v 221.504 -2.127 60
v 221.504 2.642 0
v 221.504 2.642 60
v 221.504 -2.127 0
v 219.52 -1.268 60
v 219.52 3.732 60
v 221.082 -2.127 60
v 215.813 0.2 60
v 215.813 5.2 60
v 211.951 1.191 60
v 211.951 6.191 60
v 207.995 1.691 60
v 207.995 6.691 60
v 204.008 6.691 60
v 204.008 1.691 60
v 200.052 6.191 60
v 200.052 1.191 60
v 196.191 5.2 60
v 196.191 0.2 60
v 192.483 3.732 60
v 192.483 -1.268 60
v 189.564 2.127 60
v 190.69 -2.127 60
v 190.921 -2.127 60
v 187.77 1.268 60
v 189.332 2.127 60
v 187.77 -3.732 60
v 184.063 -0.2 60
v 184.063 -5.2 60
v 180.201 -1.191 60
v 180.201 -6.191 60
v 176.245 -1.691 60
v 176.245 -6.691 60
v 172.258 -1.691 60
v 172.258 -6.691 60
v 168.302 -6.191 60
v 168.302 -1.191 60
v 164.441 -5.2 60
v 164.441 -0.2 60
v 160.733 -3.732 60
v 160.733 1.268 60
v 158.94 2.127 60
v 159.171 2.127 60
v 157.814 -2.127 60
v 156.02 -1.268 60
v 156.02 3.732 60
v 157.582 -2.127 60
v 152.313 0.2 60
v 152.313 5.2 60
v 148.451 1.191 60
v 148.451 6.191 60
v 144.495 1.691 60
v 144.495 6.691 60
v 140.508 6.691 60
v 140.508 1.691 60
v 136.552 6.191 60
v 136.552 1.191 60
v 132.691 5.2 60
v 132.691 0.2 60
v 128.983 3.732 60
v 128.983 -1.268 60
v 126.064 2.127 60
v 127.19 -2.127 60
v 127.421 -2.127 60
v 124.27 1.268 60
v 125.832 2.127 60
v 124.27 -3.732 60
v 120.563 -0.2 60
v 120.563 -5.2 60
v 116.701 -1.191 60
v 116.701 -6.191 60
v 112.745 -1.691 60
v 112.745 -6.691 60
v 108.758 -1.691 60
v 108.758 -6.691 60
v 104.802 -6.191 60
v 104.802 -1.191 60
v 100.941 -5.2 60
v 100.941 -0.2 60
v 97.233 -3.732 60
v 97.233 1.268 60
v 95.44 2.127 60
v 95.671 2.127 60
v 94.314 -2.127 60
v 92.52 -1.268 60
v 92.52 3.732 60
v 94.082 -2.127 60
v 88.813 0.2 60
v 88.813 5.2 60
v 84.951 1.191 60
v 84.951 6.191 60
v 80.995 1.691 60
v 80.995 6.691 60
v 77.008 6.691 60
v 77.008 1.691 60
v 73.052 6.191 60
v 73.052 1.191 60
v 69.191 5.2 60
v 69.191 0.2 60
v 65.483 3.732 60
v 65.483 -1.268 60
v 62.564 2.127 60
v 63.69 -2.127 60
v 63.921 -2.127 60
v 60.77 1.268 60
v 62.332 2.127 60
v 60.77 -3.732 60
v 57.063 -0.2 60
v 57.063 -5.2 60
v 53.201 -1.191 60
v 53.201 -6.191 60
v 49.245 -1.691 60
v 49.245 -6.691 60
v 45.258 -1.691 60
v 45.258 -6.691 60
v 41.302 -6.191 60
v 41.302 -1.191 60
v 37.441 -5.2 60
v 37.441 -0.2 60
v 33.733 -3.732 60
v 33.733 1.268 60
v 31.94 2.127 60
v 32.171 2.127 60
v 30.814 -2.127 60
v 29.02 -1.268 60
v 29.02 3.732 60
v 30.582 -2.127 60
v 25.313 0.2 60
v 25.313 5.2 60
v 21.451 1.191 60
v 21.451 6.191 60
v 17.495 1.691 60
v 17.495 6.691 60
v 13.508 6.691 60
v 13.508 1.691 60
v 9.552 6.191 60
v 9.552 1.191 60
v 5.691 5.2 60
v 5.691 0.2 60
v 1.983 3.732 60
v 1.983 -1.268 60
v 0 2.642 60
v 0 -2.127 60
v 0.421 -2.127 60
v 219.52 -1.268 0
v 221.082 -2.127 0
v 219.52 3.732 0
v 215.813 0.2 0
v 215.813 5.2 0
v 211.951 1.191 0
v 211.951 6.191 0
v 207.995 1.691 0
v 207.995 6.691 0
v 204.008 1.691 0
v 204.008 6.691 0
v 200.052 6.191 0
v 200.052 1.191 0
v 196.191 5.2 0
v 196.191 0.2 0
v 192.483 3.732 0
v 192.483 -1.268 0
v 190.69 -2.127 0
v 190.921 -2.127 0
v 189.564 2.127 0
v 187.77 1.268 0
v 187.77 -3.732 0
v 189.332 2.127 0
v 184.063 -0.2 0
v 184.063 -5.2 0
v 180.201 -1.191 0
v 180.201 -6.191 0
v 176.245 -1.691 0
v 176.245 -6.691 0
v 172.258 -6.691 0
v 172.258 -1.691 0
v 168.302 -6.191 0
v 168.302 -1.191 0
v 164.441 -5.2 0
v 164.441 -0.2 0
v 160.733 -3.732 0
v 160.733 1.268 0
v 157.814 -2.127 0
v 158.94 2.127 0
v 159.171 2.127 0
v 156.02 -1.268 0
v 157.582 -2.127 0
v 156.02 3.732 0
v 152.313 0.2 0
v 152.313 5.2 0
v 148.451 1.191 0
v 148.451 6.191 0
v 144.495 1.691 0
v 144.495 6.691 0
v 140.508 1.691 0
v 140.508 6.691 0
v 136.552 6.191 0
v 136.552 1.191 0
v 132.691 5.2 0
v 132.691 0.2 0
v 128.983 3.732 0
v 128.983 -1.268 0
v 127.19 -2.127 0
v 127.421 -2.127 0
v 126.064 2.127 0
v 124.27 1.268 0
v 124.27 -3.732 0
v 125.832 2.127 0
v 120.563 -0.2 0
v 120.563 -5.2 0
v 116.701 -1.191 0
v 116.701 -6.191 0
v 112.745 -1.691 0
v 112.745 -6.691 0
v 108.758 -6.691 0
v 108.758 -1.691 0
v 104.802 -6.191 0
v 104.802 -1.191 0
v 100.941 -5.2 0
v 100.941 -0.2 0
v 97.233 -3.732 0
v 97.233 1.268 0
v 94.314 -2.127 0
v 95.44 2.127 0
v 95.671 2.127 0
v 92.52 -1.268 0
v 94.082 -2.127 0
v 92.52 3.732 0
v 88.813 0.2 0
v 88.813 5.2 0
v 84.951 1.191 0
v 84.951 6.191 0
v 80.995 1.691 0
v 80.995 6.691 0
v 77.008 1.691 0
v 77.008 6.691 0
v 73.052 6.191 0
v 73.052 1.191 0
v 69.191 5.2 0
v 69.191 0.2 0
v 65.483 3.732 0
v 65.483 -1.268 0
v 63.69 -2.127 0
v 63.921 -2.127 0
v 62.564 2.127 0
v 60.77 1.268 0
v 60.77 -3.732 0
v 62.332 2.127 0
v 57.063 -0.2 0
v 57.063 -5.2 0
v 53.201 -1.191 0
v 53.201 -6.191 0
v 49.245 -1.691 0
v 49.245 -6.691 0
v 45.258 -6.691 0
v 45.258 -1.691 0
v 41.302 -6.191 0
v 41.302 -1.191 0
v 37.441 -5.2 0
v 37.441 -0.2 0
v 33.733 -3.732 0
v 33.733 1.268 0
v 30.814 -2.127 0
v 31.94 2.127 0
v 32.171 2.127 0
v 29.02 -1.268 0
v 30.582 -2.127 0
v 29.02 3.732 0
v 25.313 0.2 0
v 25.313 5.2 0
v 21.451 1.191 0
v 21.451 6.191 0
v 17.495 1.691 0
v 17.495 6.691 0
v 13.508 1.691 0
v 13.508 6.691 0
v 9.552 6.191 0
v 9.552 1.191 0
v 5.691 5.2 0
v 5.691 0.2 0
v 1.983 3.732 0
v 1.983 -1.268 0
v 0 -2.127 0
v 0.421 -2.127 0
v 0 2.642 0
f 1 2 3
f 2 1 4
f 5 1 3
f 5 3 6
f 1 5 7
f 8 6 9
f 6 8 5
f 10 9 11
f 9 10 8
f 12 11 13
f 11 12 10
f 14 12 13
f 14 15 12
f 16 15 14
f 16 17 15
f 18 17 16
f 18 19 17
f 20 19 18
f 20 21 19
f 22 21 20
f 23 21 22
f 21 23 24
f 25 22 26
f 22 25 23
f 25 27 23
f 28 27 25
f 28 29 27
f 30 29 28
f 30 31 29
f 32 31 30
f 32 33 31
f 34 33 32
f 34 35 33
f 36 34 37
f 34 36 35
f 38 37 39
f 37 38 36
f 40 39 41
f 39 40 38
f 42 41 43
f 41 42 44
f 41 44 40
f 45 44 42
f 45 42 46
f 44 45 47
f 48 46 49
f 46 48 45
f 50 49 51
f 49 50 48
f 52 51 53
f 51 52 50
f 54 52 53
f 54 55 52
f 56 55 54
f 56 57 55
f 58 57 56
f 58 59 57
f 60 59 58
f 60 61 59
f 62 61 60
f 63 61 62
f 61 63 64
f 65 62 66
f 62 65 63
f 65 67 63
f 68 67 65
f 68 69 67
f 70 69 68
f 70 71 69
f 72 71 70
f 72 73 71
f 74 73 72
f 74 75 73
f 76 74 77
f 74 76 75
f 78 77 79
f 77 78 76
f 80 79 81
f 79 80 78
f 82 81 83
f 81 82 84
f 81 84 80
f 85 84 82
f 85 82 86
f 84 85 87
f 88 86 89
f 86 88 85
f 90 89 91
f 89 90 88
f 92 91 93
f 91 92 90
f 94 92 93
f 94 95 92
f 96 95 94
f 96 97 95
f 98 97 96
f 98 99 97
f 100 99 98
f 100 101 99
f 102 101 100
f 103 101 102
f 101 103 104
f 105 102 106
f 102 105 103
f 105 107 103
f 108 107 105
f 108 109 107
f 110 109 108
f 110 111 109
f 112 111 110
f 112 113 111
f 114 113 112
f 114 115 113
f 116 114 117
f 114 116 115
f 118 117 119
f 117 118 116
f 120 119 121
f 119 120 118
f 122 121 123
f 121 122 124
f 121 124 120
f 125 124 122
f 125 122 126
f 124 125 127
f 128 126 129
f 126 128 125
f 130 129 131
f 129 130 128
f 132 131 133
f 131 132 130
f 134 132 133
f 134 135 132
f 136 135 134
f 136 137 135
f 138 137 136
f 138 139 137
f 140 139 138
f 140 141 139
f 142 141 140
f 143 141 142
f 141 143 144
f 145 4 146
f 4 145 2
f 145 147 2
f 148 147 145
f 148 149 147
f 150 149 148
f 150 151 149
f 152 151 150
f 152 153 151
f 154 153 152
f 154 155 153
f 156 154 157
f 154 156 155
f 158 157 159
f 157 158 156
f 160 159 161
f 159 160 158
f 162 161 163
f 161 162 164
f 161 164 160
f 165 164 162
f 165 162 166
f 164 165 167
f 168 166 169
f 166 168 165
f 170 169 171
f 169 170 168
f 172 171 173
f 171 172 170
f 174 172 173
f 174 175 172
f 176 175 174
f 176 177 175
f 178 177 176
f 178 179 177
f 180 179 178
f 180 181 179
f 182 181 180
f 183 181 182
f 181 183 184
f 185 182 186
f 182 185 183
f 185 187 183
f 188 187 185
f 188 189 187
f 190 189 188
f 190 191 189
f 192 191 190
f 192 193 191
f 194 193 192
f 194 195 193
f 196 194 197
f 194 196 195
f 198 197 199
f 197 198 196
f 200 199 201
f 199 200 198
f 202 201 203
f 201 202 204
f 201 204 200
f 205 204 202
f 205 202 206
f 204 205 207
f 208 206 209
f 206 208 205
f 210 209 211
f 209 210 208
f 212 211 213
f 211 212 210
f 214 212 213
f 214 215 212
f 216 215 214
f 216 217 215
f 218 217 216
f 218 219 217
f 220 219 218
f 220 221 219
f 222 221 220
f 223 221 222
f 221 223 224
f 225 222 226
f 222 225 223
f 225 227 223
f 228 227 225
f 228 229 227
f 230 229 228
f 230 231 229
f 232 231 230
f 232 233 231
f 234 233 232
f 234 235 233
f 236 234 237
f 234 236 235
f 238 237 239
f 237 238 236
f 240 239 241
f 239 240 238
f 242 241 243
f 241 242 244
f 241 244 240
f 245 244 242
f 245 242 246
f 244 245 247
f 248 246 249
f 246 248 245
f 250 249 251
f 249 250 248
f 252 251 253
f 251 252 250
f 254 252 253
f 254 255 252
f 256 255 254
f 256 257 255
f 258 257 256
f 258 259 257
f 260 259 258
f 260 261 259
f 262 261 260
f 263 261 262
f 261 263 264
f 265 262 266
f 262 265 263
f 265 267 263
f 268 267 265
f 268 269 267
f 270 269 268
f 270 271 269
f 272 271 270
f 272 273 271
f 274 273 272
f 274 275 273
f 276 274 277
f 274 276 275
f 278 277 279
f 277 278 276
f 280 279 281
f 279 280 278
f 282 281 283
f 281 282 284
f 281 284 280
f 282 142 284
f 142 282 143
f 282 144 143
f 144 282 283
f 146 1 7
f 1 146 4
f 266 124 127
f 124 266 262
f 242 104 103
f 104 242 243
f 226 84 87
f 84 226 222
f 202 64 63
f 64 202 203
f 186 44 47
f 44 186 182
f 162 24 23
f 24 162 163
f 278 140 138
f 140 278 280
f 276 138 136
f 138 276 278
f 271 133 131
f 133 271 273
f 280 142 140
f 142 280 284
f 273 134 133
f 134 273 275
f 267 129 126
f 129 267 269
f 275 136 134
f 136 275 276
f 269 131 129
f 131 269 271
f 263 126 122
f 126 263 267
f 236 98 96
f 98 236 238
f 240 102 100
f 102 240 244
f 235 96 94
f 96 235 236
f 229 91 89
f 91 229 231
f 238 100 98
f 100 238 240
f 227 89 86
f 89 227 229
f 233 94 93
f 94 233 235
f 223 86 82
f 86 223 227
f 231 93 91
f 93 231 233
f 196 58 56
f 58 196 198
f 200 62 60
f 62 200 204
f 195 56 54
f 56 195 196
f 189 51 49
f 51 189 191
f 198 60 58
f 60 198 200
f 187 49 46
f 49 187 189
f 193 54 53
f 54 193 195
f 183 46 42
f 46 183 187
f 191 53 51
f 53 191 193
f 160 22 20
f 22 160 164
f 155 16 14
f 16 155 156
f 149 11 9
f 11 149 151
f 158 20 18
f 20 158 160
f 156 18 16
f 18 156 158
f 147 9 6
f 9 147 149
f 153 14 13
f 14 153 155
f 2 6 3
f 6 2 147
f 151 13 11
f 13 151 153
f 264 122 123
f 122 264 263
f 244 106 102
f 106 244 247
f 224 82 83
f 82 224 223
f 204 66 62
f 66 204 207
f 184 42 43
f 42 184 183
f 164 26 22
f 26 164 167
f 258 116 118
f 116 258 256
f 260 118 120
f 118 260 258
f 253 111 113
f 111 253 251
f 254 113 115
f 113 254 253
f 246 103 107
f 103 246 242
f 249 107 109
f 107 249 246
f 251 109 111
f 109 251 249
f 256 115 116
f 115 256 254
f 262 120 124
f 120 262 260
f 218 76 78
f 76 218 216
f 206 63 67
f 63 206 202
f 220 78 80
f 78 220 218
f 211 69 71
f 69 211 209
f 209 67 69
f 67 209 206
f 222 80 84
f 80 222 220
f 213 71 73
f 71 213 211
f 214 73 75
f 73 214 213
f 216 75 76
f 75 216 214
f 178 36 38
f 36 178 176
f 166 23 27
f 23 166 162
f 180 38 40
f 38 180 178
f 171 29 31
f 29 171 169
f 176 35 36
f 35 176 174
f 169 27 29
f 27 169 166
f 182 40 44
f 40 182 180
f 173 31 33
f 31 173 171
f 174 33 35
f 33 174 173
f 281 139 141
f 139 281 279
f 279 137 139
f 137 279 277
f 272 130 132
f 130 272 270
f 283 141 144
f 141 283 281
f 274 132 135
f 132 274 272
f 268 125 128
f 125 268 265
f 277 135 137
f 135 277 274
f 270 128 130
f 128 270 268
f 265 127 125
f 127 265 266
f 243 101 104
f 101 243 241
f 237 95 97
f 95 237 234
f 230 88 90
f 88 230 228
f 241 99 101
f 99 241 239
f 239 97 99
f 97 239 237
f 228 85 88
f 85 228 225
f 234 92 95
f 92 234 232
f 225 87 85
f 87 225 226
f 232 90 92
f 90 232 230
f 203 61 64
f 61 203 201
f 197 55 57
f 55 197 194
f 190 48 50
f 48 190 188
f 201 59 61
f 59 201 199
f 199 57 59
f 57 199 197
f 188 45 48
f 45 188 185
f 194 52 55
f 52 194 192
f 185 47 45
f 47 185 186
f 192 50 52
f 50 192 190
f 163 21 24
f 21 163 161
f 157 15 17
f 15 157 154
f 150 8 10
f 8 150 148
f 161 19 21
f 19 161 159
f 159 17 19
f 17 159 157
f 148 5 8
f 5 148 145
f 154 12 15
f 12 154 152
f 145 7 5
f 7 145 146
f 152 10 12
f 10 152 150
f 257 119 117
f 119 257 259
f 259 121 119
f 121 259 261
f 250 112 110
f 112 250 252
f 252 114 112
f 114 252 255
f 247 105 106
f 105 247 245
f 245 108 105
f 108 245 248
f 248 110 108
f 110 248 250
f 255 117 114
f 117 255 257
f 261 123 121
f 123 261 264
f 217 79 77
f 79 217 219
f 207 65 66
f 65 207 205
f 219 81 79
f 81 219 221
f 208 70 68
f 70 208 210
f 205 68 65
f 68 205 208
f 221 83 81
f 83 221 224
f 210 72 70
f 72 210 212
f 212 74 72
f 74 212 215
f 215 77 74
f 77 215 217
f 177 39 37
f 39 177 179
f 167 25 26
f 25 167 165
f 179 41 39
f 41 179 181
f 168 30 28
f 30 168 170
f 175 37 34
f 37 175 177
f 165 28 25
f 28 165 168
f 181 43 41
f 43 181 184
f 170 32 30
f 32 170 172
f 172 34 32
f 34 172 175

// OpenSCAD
//Config values
/* [Layout] */
//How many cans fit on the bottom row
NumberOfCansOnBottom = 4;
//How thick should it be between the cans (in mm)
DividerThickness = 5;
//How deep should it be along the height of the can (in mm)
DividerDepth = 60;  //Full can height is 121.92


BetweenCanShape = 1; //[0:square edges, 1:smooth curve, 2:faceted curve]


/* [Details] */
//Some other can size? (in mm)
CanRadius = 31.75;





//######## Between Can Options
//VERSION0 is flat surfaces
VERSION0 = BetweenCanShape == 0;
//VERSION1 is smooth curves, same size as cans
VERSION1 = BetweenCanShape == 1;
//VERSION2 is faceted curves, same size as cans, see facetCurveCount to adjust
VERSION2 = BetweenCanShape == 2;
//#####End Between Can Options


//Height of square edges option
SquareEdgesHeight = 10;

//THESE OPTIONS WORK PRETTY WELL
//Faceted curve number
facetCurveCount = 18; //[10, 12, 18, 24]


//######## End Options

//Version 0 has edges that extend past the can
//Version 1 has edges that touch the can
ENDS_VERSION = 1;  //[0:extend past can, 1:edges stop at can]]
//#####End End Options


//###### applying option calculations
retainThickness = VERSION0 ? SquareEdgesHeight/2 : DividerThickness/2;
moveShitOver = [
			//Version 0:
			0,
			//Verison 1:
			VERSION0
				?	CanRadius-sqrt(((CanRadius-retainThickness)*(CanRadius-retainThickness))
					+(CanRadius*CanRadius))
				: -CanRadius * sin(60) / 2 - retainThickness
			];
width = NumberOfCansOnBottom * CanRadius * 2
				+ moveShitOver[ENDS_VERSION]*2;


/* [Smoothness] */
$fn = 50;
/* [Hidden] */
OVERLAP=0.1;

////Setup
//canCenters = [for (i = [0:NumberOfCansOnBottom])
//{
//	
//}
//];


CombineAll();

module CombineAll()
{
	difference()
	{
		//Positive
		union()
		{
			if (VERSION0) {
				MainPiece(SquareEdgesHeight);
			}


			if (VERSION1) {
				assign (offset = CanRadius * sin(60) / 2)
				{
				intersection()
				{
					translate(v=[0, offset, 0])
						MainPiece(CanRadius);
					AllCanShapes(-DividerThickness, bottom = false, overlap = false);
				}
				intersection()
				{
					translate(v=[0, -offset, 0])
						MainPiece(CanRadius);
					AllCanShapes(-DividerThickness, top = false, overlap = false);
				}
				}
			}


			if (VERSION2) {
				assign (offset = CanRadius * sin(60) / 2)
				intersection()
				{
					translate(v=[0, offset, 0])
						MainPiece(CanRadius);
					AllCanShapes(-DividerThickness, bottom = false, overlap = false, $fn = facetCurveCount);
				}
				intersection()
				{
					translate(v=[0, -offset, 0])
						MainPiece(CanRadius);
					AllCanShapes(-DividerThickness, top = false, overlap = false, $fn = facetCurveCount);
				}
			}
		}
		
		//Negative
		union()
		{
			AllCanShapes(DividerThickness);
		}
	}
}

module AllCanShapes(thicknessToRetain, bottom = true, top = true, overlap = true)
{
	translate(v = [moveShitOver[ENDS_VERSION], 0, 0])
		AllCanShapes_Version0(thicknessToRetain, bottom, top, overlap = overlap);
}
module AllCanShapes_Version0(thicknessToRetain, bottom = true, top = true, overlap = true)
{
	retain = thicknessToRetain/2;

	if (top)
		CanShapes([CanRadius, -CanRadius * sin(60) - retain, 0], NumberOfCansOnBottom, overlap = overlap);
	if (bottom)
		CanShapes([CanRadius*2, CanRadius * sin(60) + retain, 0], NumberOfCansOnBottom-1, overlap = overlap);
}


module MainPiece(height)
{
	difference()
	{
		//Positive
		union()
		{
			translate(v=[0, -height/2, 0])
				cube(size = [width, height, DividerDepth]);
		}
		
		//Negative
		union()
		{
		}
	}
}

module CanShapes(v, number, overlap = true)
{
	difference()
	{
		//Positive
		union()
		{
			translate(v=v){
				for (i = [0:number-1]) {
					translate(v=[i*2*CanRadius, 0, overlap ? -OVERLAP : 0])
						cylinder(h=DividerDepth + (overlap ? 2*OVERLAP : 0), r=CanRadius);
				}
			}
		}
		
		//Negative
		union()
		{
		}
	}
}
